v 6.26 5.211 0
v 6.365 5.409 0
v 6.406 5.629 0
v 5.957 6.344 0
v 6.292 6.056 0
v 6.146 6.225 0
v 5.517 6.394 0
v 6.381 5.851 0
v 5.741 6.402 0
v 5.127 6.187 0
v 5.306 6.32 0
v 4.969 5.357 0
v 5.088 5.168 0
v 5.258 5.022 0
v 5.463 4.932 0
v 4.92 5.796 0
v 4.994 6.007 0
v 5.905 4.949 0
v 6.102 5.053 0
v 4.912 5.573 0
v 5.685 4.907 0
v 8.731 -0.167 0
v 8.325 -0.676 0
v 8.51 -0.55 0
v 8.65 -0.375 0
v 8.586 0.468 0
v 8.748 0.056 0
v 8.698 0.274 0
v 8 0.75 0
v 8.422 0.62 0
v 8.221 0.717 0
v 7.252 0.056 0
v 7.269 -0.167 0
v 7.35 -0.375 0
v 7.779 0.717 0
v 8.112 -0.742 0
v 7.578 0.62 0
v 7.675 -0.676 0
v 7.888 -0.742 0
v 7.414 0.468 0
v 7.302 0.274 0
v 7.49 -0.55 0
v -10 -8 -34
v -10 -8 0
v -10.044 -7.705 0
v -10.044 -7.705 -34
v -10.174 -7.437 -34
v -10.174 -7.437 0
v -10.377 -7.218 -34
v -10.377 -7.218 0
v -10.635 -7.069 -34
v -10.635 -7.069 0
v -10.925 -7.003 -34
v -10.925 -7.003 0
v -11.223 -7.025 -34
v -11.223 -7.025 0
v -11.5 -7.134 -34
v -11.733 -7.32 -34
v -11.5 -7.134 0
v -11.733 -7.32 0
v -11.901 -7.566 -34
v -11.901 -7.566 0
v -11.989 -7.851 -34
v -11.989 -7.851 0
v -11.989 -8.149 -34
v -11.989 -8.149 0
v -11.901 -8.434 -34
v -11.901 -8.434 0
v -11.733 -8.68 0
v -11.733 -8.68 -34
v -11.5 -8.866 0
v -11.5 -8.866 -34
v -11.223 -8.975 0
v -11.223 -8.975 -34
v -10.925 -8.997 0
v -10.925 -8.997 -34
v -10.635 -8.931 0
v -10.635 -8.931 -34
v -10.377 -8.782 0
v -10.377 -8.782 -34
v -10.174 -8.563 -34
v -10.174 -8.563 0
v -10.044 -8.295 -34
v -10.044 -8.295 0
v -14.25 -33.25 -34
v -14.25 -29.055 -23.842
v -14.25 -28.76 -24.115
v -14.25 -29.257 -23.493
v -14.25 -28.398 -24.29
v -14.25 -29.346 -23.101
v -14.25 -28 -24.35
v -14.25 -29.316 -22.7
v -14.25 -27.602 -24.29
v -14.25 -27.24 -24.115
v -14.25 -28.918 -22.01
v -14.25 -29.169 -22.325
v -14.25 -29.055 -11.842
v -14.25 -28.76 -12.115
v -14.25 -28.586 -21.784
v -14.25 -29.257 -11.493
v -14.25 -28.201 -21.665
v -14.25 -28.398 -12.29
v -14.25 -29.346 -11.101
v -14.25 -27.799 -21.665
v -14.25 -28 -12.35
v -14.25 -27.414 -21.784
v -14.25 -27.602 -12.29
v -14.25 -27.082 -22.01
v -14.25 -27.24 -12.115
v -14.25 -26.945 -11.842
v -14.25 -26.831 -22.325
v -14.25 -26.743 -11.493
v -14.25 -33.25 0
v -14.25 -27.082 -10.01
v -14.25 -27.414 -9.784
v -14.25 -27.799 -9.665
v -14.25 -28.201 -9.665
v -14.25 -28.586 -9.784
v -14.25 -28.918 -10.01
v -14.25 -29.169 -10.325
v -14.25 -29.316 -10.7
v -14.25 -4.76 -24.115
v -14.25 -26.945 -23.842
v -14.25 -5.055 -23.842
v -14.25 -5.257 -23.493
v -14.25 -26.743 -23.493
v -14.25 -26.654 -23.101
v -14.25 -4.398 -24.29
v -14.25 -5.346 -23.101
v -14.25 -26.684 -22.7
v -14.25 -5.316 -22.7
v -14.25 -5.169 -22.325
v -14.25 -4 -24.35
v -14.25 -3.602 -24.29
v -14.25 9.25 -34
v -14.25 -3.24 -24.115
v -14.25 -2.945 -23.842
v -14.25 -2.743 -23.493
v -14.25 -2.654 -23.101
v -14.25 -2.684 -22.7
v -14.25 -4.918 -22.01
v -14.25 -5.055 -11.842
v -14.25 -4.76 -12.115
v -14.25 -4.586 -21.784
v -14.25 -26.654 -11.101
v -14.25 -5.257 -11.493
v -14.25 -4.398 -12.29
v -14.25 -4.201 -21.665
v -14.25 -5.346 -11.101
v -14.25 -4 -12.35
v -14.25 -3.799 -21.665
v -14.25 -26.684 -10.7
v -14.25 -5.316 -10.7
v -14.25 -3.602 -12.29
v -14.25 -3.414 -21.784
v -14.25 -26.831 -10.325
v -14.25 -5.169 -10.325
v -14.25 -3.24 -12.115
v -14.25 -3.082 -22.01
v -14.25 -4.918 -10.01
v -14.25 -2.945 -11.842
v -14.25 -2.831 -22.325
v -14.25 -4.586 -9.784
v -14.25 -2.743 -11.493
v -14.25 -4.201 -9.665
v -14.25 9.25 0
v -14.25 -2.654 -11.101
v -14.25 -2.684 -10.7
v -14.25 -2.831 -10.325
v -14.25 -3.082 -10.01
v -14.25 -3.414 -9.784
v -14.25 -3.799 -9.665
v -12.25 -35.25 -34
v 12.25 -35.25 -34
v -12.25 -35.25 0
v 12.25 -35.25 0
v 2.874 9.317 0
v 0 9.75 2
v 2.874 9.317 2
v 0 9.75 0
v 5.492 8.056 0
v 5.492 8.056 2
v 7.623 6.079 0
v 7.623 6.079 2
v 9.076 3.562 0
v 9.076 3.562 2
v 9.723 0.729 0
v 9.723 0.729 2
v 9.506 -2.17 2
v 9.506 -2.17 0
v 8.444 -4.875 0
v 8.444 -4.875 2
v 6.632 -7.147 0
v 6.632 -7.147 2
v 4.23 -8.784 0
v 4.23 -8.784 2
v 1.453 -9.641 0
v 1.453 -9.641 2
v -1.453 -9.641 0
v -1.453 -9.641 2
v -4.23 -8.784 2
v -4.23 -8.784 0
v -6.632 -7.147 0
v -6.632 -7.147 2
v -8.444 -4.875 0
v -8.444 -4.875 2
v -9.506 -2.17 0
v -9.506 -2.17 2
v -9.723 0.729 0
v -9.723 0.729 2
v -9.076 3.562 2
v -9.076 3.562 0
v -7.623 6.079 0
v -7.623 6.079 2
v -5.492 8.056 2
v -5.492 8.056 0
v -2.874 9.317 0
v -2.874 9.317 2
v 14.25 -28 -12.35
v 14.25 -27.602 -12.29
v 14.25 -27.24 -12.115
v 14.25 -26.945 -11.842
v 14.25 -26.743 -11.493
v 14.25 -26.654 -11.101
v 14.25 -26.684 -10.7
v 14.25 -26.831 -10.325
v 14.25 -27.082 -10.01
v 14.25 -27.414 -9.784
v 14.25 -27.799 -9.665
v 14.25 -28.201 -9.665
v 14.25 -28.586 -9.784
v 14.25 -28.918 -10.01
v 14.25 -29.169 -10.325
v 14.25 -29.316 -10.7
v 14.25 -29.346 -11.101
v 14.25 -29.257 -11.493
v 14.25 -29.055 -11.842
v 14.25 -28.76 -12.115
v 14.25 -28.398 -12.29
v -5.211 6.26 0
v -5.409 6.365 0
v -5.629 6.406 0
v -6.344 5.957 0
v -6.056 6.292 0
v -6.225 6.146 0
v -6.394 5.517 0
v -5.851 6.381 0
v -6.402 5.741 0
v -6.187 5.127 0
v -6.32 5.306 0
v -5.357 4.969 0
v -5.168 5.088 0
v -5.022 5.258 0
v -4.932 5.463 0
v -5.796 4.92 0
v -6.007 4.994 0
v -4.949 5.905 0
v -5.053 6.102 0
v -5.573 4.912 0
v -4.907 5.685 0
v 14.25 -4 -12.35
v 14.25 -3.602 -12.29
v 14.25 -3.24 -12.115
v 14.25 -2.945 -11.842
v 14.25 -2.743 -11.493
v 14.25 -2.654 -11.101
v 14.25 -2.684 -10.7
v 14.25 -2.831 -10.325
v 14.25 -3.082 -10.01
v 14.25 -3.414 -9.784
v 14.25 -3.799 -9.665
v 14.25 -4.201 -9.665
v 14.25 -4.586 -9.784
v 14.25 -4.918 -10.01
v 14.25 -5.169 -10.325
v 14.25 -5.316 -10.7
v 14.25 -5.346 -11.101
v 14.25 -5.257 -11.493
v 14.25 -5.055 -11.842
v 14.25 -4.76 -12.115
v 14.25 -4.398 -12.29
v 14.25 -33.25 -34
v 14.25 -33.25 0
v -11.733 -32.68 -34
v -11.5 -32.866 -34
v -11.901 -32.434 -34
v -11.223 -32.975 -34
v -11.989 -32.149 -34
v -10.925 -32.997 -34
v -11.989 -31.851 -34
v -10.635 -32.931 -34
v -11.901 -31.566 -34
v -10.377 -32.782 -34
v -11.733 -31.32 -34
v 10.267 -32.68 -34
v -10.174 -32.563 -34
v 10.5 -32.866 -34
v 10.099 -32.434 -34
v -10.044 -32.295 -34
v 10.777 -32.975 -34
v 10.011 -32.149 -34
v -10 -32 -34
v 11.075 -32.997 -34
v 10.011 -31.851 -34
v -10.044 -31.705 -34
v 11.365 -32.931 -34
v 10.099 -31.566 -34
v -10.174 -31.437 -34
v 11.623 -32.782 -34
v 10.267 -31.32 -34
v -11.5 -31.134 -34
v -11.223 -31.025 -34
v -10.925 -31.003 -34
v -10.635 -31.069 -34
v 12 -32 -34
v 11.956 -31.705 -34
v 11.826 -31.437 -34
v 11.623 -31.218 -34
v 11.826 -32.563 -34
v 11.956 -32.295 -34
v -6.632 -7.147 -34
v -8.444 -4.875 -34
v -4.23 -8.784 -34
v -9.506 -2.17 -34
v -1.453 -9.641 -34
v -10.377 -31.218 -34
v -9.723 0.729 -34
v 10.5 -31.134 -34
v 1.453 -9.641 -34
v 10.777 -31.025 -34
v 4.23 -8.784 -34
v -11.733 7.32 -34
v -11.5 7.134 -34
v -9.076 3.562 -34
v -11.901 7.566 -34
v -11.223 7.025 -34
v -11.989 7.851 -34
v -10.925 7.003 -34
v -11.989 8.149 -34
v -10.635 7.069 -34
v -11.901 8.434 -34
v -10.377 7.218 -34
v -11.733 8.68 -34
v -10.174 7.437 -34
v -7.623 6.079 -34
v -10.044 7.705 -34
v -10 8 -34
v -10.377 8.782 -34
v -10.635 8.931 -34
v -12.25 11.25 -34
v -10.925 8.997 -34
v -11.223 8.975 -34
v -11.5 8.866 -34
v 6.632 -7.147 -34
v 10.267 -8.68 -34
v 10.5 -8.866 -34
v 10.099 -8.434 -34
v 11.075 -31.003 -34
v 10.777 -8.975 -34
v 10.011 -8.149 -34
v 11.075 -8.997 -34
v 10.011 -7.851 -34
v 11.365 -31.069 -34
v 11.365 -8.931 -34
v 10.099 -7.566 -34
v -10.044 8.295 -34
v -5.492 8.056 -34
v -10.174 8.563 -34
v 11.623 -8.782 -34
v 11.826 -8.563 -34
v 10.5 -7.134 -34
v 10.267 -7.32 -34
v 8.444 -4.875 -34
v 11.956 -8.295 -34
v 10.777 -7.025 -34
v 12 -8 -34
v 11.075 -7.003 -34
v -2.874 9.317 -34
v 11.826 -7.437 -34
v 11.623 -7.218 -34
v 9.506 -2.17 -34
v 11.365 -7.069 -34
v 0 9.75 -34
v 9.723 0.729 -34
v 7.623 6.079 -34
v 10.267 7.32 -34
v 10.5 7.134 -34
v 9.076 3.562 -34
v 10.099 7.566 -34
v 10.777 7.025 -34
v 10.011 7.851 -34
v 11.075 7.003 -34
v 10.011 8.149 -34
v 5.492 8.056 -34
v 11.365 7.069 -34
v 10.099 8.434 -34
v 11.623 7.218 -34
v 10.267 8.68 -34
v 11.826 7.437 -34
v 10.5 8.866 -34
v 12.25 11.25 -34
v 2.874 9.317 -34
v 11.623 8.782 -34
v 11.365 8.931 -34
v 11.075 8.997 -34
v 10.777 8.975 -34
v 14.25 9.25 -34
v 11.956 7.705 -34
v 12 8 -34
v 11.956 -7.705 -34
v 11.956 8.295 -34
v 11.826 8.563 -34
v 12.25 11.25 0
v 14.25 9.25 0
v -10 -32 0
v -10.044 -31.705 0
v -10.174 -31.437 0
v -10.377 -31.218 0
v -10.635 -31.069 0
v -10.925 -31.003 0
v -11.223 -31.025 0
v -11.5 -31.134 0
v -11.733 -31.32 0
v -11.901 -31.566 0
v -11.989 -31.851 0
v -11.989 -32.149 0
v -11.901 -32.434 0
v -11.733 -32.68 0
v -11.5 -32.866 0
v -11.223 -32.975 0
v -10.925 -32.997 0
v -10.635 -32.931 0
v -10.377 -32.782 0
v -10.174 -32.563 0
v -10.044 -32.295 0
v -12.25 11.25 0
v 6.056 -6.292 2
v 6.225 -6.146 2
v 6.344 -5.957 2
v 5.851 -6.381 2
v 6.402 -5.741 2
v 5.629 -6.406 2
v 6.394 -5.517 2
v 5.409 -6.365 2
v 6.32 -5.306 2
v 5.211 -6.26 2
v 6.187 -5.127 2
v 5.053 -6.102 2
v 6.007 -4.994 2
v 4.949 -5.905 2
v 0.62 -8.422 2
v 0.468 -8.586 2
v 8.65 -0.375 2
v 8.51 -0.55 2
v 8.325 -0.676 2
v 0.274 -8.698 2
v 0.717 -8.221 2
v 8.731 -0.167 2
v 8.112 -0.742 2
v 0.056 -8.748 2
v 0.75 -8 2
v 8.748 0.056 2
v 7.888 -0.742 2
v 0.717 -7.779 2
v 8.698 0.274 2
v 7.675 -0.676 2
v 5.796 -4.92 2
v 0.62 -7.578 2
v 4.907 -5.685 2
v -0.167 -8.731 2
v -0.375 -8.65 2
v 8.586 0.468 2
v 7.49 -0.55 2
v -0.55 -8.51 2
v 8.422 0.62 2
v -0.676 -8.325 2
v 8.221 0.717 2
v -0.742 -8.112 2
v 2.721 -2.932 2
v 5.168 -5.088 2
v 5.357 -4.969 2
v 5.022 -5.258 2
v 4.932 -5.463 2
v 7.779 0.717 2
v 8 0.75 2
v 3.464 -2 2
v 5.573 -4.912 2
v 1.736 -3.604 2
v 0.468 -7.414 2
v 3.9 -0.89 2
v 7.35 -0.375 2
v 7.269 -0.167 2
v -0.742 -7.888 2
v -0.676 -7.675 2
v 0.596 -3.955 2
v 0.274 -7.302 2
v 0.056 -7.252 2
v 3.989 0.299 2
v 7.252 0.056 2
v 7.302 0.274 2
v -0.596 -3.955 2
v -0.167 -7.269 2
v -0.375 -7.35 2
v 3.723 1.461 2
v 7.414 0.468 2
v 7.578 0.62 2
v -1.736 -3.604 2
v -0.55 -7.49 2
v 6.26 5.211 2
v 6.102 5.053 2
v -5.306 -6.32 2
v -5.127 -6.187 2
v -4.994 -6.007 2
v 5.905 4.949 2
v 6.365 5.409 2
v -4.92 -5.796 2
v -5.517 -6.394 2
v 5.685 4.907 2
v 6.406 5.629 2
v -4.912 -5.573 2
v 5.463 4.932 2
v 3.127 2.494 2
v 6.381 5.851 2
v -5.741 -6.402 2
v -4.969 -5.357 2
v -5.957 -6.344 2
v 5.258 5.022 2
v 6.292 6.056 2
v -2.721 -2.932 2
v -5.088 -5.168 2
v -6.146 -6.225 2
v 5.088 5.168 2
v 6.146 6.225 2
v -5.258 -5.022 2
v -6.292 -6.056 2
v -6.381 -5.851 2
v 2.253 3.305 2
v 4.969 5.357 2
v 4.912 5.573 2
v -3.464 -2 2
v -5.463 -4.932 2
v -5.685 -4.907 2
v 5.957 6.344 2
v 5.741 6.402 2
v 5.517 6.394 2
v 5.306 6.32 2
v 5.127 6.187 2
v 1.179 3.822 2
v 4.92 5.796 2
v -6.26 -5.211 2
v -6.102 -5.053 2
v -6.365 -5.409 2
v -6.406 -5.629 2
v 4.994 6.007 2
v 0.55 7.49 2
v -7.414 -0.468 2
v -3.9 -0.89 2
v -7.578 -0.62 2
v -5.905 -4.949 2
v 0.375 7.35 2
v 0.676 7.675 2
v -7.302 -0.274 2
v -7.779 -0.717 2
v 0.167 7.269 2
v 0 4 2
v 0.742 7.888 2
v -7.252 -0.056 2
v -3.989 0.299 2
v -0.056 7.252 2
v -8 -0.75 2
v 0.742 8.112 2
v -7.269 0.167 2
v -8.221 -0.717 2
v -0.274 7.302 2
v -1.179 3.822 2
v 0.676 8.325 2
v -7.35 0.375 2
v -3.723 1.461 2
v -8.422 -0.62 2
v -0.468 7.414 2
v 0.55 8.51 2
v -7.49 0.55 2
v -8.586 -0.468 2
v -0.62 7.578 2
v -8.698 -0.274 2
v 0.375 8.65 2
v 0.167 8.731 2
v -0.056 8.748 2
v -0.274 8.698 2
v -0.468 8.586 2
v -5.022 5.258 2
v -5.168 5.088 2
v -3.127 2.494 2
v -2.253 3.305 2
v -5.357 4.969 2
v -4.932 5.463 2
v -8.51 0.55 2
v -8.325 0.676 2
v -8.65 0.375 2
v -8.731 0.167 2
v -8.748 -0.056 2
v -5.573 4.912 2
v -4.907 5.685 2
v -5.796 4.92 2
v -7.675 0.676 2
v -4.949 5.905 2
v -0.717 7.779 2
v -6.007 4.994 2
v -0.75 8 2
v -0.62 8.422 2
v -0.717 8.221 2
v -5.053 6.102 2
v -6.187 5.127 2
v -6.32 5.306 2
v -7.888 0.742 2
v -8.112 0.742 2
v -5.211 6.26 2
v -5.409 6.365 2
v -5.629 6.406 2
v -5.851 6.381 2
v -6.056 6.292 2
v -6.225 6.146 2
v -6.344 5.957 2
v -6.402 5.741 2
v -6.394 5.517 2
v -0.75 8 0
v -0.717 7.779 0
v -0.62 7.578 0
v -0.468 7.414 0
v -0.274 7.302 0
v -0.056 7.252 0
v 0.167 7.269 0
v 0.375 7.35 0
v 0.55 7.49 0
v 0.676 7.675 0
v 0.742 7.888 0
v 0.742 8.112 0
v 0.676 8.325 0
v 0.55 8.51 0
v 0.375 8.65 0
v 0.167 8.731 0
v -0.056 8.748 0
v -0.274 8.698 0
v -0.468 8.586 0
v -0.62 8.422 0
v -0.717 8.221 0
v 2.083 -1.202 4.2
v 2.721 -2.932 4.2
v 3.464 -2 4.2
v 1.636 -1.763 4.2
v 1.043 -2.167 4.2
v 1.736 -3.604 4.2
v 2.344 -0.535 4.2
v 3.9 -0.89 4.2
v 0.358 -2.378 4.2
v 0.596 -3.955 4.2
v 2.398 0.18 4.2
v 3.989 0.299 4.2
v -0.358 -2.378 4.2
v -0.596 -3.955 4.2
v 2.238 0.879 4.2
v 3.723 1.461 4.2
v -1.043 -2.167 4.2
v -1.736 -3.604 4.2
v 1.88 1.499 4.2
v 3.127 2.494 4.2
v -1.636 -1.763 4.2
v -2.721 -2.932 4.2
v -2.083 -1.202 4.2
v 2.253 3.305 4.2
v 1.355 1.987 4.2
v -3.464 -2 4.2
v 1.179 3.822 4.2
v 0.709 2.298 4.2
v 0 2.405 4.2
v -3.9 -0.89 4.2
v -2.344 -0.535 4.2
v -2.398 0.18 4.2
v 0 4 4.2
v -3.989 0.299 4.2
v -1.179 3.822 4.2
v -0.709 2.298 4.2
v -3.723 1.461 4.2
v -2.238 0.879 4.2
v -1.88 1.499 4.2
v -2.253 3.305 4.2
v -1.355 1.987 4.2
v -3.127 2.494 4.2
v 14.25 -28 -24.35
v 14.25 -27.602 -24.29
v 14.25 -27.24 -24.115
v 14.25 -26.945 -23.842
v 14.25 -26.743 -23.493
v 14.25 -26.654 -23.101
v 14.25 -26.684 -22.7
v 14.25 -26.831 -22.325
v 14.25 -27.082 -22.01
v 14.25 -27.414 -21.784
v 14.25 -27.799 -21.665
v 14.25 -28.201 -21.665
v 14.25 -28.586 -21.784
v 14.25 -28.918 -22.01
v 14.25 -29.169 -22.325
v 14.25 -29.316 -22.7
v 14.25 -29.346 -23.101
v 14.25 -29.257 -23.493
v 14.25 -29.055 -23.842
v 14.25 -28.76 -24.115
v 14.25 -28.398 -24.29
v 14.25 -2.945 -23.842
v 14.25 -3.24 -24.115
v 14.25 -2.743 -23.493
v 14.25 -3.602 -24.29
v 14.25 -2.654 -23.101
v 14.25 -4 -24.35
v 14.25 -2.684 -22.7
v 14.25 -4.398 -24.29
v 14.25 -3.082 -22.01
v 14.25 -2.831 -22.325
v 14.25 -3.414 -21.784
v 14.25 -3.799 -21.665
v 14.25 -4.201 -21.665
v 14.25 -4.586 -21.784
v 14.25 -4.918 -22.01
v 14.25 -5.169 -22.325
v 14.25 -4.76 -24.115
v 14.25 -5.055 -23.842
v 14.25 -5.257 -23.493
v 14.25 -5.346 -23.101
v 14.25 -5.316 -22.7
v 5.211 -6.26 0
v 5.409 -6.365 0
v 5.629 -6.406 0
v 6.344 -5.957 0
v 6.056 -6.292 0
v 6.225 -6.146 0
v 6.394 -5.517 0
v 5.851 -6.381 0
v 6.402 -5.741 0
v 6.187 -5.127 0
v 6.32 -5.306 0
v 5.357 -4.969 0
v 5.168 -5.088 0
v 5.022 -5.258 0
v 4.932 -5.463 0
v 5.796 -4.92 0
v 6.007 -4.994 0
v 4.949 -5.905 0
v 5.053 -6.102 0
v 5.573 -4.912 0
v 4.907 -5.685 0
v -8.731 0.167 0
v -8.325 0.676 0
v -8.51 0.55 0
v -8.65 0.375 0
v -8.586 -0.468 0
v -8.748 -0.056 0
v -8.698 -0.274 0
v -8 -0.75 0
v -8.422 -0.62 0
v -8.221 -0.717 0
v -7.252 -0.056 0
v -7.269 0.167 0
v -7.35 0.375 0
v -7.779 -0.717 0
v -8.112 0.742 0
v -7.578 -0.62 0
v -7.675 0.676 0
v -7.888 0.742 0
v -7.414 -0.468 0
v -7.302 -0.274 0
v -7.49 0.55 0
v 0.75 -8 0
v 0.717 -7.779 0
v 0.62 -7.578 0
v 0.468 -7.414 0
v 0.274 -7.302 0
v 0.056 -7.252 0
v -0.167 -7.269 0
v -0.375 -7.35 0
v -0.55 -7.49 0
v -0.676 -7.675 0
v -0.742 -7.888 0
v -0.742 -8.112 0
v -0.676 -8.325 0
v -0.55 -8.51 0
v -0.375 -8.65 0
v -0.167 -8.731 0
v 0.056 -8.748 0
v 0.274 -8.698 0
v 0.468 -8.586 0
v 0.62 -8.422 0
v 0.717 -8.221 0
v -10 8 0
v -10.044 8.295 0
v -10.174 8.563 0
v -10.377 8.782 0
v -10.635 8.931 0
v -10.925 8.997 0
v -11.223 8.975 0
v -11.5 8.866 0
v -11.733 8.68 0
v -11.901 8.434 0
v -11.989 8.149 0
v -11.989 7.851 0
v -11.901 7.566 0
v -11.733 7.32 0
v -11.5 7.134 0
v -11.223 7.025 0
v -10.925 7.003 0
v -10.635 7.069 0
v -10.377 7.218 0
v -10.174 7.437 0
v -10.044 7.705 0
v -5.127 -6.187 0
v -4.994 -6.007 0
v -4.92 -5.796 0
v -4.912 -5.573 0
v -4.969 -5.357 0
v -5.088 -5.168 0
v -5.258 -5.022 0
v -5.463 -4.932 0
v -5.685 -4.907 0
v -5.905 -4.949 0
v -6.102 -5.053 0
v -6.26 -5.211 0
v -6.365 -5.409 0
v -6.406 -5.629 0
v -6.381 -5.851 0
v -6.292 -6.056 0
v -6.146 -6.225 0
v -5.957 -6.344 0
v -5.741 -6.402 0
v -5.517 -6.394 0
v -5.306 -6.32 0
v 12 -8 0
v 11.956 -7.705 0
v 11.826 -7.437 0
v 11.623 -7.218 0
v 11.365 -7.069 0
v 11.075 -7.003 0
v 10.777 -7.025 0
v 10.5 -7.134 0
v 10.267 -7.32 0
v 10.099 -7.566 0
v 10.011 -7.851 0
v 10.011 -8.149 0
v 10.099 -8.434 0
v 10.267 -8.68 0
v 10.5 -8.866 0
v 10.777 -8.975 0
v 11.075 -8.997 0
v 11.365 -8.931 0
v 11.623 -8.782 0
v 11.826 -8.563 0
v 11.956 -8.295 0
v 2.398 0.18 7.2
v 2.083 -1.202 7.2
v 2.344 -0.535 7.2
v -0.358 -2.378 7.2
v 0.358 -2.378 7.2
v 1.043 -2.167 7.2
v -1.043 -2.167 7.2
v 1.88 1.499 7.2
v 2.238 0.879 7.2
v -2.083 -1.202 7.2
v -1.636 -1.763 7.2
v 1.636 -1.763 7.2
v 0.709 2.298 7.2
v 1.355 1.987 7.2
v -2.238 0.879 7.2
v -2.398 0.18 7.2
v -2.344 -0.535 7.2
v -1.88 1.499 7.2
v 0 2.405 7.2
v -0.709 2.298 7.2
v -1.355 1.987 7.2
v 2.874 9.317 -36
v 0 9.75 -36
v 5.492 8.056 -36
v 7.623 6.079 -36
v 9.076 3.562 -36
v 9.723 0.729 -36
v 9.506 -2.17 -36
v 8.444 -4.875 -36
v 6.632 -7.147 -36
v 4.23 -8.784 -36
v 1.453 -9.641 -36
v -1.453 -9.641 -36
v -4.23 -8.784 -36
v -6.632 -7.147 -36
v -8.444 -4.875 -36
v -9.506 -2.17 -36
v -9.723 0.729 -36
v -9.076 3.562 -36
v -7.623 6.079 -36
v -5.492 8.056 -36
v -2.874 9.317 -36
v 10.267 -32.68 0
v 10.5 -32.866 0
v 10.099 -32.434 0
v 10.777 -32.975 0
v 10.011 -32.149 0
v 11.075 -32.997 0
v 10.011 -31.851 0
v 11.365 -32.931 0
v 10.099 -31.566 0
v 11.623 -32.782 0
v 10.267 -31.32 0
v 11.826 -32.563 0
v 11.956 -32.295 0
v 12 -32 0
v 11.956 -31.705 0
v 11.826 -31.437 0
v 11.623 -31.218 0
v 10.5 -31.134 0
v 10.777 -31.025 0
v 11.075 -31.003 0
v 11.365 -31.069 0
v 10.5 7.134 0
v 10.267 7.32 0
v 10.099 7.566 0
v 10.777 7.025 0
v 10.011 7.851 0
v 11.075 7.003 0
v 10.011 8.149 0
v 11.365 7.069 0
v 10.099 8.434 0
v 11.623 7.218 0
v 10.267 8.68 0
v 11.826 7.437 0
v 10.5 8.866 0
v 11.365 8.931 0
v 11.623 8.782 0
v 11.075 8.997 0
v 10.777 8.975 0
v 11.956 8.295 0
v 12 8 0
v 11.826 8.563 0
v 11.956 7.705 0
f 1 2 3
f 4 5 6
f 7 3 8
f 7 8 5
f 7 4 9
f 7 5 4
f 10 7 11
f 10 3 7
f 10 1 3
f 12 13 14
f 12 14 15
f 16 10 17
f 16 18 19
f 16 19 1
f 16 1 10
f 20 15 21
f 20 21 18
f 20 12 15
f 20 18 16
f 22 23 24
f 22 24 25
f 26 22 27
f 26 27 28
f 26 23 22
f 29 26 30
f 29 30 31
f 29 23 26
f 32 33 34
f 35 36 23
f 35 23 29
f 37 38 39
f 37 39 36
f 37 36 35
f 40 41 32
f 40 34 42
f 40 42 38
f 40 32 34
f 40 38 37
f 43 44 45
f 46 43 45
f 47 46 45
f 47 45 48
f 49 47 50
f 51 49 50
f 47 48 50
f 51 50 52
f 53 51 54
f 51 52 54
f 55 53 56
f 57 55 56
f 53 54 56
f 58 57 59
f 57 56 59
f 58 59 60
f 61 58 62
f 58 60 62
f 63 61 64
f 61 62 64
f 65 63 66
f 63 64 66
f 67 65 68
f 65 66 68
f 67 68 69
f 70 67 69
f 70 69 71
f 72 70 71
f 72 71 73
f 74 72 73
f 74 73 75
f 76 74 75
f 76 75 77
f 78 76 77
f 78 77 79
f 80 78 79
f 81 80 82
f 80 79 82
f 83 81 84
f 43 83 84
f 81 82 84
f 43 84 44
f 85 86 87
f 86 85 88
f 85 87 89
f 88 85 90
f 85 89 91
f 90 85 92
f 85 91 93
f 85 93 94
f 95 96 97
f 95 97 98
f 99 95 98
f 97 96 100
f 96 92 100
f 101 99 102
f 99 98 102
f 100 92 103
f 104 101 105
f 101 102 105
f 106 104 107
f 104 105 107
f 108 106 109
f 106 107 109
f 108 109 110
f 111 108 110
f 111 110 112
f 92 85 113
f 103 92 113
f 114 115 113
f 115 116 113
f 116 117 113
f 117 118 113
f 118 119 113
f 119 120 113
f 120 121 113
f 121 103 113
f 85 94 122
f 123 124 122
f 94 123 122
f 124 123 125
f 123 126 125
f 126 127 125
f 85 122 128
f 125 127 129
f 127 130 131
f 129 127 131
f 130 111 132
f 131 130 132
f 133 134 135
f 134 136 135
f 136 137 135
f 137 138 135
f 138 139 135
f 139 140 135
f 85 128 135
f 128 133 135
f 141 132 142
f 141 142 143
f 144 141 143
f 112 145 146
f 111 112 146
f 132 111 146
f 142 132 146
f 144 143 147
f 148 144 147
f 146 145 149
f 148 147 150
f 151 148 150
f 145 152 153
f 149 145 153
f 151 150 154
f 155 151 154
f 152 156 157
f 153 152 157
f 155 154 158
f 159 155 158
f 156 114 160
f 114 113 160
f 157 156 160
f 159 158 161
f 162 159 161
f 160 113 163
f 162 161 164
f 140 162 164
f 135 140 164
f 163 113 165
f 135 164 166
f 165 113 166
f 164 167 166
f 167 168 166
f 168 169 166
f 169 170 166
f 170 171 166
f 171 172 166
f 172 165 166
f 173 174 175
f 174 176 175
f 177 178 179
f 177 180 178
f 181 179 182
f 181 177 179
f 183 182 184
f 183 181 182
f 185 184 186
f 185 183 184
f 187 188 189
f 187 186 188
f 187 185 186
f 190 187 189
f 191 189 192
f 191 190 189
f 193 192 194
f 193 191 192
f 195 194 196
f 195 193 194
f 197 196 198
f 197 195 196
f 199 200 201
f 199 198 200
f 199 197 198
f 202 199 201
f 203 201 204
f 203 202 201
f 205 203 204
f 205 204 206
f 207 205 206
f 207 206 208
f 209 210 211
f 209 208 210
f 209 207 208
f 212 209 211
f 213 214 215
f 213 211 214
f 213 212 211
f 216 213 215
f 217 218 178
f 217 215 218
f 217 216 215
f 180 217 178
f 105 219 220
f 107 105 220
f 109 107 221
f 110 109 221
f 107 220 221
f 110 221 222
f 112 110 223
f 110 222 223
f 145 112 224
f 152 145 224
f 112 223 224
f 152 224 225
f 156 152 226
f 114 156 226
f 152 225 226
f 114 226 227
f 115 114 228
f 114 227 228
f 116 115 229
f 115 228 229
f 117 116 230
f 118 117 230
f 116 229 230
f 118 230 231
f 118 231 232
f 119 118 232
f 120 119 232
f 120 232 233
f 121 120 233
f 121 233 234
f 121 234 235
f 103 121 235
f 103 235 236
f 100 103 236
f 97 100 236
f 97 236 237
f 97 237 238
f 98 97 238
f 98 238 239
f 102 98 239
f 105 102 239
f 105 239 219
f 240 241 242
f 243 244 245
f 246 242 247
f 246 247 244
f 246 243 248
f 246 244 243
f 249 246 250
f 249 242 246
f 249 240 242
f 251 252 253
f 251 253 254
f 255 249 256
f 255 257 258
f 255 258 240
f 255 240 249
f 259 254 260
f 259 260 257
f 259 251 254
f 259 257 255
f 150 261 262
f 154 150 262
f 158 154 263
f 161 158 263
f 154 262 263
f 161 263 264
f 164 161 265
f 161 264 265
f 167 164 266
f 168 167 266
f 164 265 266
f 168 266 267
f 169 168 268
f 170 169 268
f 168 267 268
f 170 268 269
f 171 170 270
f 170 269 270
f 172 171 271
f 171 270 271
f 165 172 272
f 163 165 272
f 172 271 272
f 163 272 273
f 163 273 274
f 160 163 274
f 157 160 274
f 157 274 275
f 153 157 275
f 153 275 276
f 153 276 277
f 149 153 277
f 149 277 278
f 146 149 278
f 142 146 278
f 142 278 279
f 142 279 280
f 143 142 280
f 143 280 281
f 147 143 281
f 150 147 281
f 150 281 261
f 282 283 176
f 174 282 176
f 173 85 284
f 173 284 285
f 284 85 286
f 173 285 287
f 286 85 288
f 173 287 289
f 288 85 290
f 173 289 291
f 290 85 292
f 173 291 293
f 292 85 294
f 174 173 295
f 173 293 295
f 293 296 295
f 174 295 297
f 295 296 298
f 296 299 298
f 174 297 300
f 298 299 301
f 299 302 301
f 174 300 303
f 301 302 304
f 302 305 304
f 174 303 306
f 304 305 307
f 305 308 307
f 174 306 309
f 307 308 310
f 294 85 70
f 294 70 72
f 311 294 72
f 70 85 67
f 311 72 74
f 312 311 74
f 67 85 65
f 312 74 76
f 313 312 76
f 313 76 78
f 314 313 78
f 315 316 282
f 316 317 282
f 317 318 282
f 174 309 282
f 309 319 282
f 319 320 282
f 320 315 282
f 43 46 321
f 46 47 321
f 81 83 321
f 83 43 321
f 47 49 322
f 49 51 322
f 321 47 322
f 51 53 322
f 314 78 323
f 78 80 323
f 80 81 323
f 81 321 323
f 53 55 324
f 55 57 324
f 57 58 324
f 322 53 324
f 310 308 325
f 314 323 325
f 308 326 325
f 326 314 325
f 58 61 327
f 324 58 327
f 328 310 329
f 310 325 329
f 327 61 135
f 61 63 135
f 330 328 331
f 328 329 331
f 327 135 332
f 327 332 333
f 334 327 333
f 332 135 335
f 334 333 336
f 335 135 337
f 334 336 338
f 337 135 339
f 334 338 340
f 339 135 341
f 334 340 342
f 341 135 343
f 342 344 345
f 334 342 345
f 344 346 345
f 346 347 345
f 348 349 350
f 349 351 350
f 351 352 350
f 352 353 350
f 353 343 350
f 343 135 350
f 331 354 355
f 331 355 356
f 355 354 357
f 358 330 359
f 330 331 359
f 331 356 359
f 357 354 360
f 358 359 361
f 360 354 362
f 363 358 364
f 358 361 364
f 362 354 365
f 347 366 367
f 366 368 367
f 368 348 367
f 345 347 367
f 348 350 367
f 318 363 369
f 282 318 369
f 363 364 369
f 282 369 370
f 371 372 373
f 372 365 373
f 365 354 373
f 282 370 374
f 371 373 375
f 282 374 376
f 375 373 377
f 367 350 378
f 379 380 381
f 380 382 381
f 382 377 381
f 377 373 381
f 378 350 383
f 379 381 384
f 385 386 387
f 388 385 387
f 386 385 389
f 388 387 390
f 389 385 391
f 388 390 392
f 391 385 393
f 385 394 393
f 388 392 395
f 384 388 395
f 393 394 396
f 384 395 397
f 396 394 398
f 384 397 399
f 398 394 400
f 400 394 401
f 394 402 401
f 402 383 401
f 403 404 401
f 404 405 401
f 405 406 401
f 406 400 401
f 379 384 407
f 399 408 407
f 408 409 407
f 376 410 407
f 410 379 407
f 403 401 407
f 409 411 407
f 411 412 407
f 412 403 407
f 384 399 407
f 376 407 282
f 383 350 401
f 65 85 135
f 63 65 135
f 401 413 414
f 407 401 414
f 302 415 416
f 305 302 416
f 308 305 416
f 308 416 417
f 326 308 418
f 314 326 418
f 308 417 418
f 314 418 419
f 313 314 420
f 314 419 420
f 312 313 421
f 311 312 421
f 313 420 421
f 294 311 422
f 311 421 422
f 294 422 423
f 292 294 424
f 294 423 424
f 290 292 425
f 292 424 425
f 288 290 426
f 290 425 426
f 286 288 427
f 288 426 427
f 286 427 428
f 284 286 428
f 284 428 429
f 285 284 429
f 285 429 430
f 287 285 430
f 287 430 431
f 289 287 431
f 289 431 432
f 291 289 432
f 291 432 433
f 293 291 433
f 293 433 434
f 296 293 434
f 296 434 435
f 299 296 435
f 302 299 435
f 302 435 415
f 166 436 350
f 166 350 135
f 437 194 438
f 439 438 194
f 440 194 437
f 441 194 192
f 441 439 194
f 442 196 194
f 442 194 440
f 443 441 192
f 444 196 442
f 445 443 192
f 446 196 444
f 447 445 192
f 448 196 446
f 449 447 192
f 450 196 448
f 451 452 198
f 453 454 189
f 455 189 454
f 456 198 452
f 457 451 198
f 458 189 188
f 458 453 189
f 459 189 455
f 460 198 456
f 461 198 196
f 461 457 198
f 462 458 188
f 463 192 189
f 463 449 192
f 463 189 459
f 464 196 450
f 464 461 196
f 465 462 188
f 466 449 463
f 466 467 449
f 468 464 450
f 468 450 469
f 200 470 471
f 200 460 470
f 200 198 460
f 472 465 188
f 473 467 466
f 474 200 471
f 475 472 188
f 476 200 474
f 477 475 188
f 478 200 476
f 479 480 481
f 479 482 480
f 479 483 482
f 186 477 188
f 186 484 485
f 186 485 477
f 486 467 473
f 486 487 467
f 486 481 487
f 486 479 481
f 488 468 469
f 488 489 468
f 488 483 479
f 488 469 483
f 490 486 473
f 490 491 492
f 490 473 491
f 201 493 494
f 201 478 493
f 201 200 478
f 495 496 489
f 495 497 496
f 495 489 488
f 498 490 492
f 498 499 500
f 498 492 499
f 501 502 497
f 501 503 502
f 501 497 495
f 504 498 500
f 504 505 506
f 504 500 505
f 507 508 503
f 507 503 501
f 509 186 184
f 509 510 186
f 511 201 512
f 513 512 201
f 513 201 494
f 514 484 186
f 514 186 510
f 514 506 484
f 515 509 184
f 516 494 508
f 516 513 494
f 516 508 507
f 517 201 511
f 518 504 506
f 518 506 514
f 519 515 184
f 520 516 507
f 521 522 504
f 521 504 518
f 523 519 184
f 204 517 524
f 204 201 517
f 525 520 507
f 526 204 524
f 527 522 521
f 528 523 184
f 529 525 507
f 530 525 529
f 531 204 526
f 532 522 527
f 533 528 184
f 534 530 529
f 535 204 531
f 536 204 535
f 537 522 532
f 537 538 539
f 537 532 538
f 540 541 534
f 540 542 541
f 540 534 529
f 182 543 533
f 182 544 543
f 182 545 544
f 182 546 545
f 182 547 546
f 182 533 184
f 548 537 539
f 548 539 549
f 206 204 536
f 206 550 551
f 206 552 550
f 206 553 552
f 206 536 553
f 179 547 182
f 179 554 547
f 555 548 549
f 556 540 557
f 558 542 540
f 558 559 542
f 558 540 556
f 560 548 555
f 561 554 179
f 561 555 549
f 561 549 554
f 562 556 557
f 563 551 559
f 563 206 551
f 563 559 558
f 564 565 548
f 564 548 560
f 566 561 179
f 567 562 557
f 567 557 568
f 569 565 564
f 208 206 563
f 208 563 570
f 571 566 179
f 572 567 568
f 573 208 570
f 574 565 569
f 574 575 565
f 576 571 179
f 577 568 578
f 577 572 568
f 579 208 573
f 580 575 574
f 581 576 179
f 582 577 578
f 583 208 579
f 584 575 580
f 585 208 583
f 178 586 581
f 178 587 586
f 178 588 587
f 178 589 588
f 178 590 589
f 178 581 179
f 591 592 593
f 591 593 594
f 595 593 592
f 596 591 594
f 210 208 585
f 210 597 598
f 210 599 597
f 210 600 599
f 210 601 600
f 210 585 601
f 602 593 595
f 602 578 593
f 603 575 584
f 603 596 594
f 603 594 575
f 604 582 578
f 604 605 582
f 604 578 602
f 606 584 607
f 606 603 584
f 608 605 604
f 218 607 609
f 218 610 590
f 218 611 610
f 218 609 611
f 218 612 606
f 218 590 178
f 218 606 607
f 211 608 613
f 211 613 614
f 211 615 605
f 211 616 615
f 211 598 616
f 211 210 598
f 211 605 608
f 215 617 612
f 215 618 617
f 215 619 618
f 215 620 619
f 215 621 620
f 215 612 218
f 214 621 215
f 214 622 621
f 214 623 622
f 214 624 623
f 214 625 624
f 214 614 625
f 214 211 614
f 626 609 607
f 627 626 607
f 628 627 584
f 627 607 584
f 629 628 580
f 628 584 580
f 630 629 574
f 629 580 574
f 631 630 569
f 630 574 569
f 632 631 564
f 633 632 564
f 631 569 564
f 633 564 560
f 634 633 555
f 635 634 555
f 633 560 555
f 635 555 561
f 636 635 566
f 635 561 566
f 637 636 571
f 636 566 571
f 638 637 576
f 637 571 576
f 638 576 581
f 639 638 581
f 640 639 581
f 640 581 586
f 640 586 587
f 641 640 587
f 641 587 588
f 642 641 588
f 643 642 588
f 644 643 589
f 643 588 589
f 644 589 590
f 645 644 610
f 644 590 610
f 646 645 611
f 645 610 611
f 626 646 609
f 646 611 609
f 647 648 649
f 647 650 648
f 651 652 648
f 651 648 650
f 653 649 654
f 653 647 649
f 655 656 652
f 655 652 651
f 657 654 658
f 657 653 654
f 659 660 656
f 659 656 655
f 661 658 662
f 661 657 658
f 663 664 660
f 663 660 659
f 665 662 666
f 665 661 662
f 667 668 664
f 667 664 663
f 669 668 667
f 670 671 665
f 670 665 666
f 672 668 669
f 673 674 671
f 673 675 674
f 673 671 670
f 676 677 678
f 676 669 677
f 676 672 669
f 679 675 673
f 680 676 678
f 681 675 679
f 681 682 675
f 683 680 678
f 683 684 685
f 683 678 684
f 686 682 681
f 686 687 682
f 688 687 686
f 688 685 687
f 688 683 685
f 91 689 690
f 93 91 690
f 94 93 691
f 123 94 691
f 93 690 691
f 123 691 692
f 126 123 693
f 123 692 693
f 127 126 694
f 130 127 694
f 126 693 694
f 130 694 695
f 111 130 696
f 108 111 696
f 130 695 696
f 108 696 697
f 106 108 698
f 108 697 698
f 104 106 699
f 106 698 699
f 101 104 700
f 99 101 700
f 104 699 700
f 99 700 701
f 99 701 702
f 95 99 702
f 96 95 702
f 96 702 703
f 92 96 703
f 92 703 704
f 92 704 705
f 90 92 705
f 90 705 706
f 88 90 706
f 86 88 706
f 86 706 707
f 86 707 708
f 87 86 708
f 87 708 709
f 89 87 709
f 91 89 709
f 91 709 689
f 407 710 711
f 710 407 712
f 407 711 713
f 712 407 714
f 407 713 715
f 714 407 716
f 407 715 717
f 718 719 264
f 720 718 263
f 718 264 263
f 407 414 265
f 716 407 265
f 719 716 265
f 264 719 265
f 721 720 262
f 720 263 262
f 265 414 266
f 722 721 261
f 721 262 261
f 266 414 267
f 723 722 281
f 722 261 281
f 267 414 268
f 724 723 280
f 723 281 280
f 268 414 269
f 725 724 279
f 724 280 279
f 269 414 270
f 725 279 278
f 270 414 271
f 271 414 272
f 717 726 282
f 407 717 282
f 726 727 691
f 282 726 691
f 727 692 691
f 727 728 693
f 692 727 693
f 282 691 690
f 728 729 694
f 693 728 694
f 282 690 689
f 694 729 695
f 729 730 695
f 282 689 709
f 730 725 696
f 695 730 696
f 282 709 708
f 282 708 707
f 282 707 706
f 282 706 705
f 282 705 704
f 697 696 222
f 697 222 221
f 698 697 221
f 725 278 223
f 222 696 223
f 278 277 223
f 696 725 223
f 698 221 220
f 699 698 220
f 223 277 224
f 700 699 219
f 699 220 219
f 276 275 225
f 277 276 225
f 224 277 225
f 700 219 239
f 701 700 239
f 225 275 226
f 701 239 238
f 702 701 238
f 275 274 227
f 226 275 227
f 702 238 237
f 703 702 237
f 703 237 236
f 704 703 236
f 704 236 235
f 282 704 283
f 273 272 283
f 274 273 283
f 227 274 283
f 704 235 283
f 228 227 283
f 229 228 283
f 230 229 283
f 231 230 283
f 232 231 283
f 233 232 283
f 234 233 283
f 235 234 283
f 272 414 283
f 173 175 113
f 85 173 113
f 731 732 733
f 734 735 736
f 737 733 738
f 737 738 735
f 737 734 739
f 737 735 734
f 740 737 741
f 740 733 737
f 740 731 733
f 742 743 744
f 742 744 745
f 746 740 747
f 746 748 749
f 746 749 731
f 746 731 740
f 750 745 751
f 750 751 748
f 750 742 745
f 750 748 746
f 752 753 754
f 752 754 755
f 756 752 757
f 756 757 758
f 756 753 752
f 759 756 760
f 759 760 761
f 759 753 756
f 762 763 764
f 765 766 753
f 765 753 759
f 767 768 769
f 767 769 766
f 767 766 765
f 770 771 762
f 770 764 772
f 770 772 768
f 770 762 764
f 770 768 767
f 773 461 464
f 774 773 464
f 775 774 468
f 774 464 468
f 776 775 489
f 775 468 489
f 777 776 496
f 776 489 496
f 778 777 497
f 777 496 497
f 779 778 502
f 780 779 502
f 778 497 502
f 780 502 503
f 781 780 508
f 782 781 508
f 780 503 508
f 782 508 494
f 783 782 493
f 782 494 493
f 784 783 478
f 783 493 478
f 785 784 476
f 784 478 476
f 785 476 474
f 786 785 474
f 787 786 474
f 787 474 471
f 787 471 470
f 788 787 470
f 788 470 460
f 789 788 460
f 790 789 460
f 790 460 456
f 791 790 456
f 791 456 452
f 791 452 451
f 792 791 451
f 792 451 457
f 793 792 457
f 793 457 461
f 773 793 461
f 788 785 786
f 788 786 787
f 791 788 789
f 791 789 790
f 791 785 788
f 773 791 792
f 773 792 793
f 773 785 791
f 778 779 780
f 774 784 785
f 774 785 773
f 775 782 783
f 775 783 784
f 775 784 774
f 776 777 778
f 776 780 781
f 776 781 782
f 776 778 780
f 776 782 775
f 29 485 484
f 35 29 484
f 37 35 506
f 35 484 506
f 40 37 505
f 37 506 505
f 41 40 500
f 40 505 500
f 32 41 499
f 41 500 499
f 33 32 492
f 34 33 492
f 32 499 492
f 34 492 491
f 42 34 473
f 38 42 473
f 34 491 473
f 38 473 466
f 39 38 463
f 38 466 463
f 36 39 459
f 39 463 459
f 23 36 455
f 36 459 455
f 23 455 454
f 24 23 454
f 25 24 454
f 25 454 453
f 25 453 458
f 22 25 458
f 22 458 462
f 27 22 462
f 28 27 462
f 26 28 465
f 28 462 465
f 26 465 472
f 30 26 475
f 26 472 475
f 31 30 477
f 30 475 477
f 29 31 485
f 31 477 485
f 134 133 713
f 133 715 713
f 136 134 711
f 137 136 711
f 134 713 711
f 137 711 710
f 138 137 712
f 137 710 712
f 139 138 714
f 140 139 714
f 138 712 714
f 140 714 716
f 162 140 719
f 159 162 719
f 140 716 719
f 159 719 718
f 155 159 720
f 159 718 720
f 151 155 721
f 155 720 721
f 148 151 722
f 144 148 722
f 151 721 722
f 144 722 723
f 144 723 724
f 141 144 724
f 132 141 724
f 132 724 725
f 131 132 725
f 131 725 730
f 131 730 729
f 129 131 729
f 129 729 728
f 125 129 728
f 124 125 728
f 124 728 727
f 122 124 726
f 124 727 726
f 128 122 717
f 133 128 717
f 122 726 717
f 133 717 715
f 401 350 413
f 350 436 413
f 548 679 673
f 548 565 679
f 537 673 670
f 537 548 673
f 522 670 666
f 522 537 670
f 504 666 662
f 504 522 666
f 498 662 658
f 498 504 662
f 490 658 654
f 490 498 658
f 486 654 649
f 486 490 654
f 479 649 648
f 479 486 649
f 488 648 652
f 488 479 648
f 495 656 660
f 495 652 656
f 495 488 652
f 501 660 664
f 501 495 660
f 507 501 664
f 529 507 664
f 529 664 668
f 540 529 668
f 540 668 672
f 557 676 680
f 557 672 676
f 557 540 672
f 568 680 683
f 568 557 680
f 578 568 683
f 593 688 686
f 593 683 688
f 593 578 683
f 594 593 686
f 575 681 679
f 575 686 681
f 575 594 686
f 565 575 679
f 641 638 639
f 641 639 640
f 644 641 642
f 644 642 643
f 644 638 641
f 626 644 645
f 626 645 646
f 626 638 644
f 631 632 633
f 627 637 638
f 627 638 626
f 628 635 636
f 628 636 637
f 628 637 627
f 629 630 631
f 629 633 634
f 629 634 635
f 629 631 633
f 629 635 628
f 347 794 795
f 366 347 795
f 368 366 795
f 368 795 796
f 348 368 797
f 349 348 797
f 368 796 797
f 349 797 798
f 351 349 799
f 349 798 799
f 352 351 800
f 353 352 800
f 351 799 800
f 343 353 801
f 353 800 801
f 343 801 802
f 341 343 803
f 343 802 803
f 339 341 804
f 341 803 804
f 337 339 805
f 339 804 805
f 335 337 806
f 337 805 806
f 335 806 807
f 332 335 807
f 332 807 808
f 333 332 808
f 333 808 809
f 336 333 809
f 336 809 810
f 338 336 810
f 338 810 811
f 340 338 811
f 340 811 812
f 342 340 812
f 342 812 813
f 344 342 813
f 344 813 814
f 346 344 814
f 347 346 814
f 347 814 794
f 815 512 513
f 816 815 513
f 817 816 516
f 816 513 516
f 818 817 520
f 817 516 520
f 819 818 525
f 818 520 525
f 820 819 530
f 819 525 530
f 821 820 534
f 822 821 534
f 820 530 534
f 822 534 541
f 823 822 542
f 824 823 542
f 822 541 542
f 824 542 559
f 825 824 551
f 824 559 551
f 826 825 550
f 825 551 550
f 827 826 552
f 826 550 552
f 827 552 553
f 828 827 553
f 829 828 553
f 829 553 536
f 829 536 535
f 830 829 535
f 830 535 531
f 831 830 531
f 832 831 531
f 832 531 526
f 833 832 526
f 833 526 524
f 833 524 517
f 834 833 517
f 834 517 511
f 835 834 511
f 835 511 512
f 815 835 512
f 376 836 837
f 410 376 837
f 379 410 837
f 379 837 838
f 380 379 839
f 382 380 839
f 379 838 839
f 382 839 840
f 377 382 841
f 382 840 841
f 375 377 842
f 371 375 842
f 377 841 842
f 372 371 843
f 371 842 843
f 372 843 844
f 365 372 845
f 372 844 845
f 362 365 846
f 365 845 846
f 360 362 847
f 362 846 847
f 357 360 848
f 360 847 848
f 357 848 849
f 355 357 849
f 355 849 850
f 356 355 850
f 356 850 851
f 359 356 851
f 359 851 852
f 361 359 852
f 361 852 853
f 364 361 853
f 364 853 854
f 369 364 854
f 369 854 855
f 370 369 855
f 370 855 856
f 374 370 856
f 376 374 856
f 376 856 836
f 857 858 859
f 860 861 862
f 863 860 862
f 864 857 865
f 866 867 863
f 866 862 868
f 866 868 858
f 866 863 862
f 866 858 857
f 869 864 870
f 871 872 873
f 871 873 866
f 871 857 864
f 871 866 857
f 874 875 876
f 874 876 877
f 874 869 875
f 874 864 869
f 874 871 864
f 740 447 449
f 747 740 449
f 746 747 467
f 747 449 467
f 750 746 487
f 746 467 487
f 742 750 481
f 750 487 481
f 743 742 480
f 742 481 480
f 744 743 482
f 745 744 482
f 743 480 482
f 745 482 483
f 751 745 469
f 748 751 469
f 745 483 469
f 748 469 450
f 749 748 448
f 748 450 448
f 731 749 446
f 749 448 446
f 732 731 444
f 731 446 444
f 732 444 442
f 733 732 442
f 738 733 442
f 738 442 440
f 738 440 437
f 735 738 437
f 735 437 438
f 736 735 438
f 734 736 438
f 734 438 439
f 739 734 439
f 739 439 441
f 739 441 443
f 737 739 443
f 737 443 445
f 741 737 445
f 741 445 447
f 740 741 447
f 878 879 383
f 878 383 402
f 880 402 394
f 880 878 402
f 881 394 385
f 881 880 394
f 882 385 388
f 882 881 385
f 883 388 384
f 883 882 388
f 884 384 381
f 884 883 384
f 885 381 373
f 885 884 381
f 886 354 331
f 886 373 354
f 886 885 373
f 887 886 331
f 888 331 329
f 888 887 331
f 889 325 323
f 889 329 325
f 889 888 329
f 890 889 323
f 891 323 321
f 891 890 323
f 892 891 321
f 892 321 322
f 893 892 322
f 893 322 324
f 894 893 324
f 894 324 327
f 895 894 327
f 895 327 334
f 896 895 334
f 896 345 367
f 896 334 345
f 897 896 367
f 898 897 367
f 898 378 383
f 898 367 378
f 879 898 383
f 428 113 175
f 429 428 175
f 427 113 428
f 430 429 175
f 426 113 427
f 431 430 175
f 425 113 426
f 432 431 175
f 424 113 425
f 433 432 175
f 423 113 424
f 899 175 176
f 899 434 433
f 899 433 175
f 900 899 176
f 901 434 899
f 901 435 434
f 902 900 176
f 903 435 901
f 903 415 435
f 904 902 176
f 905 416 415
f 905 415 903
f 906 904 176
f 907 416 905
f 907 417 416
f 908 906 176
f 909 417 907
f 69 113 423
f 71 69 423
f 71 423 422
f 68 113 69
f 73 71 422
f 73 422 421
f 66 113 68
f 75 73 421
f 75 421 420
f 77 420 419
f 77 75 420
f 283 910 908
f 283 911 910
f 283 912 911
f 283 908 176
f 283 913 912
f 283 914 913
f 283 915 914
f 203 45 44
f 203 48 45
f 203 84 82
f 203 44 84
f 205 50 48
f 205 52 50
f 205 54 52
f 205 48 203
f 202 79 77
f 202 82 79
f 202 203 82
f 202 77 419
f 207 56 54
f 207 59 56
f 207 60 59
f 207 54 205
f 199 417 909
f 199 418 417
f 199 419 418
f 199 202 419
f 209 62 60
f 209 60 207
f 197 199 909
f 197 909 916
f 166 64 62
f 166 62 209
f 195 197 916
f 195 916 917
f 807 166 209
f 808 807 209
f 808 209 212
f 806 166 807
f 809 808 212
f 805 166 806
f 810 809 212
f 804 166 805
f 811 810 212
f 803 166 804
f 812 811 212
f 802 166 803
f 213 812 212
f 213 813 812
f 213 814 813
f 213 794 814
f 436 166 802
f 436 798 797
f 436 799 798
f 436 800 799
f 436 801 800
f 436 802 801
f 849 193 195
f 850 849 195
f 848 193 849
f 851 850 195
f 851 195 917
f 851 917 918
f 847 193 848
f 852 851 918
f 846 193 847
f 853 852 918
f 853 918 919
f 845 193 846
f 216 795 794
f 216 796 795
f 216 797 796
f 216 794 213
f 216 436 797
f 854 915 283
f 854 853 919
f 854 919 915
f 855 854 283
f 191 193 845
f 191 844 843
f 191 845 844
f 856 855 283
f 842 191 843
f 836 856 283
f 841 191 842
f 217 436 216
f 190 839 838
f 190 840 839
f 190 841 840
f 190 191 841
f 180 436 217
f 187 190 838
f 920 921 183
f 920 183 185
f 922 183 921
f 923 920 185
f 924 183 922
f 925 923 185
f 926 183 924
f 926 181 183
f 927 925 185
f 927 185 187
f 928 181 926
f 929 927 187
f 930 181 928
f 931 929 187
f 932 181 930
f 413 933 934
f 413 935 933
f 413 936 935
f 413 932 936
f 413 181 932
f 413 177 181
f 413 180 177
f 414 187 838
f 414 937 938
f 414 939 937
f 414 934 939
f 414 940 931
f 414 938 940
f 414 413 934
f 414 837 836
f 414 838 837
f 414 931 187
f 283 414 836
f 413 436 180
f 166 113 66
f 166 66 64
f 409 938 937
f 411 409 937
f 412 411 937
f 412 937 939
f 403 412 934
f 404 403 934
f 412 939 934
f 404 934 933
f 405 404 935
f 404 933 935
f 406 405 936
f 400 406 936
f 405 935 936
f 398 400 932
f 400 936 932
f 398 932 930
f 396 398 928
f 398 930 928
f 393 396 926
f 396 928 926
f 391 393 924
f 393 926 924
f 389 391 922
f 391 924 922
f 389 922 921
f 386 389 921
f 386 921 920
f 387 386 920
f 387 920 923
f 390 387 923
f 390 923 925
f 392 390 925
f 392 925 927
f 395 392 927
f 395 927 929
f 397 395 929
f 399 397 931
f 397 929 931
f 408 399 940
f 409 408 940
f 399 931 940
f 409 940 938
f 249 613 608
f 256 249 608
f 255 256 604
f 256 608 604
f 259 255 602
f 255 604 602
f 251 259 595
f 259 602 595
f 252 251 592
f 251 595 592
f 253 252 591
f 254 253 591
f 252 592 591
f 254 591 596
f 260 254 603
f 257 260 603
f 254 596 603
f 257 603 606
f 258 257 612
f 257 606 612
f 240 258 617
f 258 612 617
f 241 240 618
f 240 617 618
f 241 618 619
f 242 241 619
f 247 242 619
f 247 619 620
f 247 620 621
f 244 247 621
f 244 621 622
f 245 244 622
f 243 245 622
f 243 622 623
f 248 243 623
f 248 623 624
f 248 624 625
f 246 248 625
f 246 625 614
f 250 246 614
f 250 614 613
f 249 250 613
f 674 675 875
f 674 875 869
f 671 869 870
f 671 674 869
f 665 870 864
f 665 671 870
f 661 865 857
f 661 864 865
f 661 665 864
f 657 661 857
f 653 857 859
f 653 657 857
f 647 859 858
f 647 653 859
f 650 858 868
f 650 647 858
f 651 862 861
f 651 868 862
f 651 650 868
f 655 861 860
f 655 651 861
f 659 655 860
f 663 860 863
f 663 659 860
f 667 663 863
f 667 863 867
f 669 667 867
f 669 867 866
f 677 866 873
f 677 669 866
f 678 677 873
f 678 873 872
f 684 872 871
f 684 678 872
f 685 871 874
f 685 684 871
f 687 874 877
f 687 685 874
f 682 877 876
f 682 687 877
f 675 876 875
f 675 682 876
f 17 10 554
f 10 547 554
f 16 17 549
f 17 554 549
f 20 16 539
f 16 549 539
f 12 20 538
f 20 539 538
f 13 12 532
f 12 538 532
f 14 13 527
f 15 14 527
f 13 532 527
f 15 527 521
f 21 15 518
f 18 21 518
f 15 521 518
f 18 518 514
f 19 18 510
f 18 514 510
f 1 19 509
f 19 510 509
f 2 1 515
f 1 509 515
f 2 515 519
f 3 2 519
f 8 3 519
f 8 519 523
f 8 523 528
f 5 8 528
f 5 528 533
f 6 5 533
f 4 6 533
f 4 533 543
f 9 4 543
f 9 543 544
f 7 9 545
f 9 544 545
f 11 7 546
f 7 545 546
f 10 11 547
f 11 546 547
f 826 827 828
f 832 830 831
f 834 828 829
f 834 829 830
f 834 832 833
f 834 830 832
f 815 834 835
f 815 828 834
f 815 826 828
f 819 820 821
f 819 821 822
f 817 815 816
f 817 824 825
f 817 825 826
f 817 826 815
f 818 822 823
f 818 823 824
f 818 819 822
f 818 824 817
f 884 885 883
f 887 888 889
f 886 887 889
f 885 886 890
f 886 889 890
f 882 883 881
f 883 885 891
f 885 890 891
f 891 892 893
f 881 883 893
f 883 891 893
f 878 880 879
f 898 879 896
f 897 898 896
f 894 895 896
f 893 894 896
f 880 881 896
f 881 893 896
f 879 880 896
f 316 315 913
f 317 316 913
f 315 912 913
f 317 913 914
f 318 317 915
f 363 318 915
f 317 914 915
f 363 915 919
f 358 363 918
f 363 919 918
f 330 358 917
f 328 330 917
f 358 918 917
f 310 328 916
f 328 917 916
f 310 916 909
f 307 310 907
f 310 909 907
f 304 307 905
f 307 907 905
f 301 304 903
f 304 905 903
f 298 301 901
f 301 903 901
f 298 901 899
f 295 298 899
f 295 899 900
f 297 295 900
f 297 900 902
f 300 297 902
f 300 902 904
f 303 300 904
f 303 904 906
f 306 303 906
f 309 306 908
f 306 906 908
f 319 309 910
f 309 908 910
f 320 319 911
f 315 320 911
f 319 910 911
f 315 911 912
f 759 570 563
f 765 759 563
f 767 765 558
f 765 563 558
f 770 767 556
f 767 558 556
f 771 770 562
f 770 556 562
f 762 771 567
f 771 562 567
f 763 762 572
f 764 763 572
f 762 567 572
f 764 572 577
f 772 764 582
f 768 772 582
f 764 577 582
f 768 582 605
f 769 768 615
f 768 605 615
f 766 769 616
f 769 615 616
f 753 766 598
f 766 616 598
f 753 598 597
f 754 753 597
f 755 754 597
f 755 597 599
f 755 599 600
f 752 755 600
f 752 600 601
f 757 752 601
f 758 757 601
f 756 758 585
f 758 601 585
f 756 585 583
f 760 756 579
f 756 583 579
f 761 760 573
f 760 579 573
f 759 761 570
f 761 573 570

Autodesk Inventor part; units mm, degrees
ref_plane "YZ Plane" through (0, 0, 0) normal (1, 0, 0) x (0, 1, 0)
ref_plane "XZ Plane" through (0, 0, 0) normal (0, 1, 0) x (-1, 0, 0)
ref_plane "XY Plane" through (0, 0, 0) normal (0, 0, 1) x (1, 0, 0)
sketch "Эскиз1" plane through (0, 0, 0) normal (0, 0, 1) x (1, 0, 0)
  line L0 (-12.25, 11.25) -> (12.25, 11.25)
  line L1 (14.25, 9.25) -> (14.25, -33.25)
  line L2 (12.25, -35.25) -> (-12.25, -35.25)
  line L3 (-14.25, -33.25) -> (-14.25, 9.25)
  circle A0 centre (-11, 8) radius 1
  circle A1 centre (-11, -8) radius 1
  circle A2 centre (11, 8) radius 1
  circle A3 centre (11, -8) radius 1
  circle A4 centre (11, -32) radius 1
  circle A5 centre (-11, -32) radius 1
  line L4 (-12.25, 11.25) -> (-14.25, 9.25)
  line L5 (12.25, 11.25) -> (14.25, 9.25)
  line L6 (14.25, -33.25) -> (12.25, -35.25)
  line L7 (-12.25, -35.25) -> (-14.25, -33.25)
  point P0 (0, 0)
  point P1 (-14.25, 11.25)
  point P2 (14.25, -35.25)
  point P3 (14.25, 11.25)
  point P4 (-14.25, -35.25)
  point P5 (0, 11.25)
  dimension "d0" = 28.5
  dimension "d1" = 46.5
  dimension "d2" = 11.25
  dimension "d3" = 22
  dimension "d4" = 11
  dimension "d5" = 8
  dimension "d6" = 8
  dimension "d7" = 40
  dimension "d8" = 2
  dimension "d11" = 2
  dimension "d12" = 2
  dimension "d13" = 2
  dimension "d14" = 2
  dimension "d15" = 2
  dimension "d16" = 2
  dimension "d17" = 2
  dimension "d18" = 2
extrude "Выдавливание1" add sketch "Эскиз1" against normal blind 34
sketch "Эскиз2" plane through (0, 0, 0) normal (1, 0, 0) x (0, 1, 0)
  line L0 (0, 0) -> (0, 7.2)
  line L1 (0, 7.2) -> (2.4047, 7.2)
  line L2 (2.4047, 7.2) -> (2.4047, 4.2)
  line L3 (2.4047, 4.2) -> (4, 4.2)
  line L4 (4, 4.2) -> (4, 2)
  line L5 (4, 2) -> (9.75, 2)
  line L6 (9.75, 2) -> (9.75, 0)
  line L7 (9.75, 0) -> (0, 0)
  line L8 (-33.25, -34) -> (9.25, -34) projected
  line L9 (0, -34) -> (9.75, -34)
  line L10 (9.75, -34) -> (9.75, -36)
  line L11 (9.75, -36) -> (0, -36)
  line L12 (0, -36) -> (0, -34)
  point P0 (1.2024, 7.2)
  dimension "d19" = 19.5
  dimension "d20" = 8
  dimension "d21" = 2
  dimension "d22" = 2.2
  dimension "d23" = 2
  dimension "d24" = 19.5
  dimension "d25" = 41.2
revolve "Вращение1" add sketch "Эскиз2" angle 360 about axis through (0, 0, 0) along (0, 0, 1)
sketch "Эскиз3" plane through (14.25, -33.25, 0) normal (1, 0, 0) x (0, 0, -1)
  circle A0 centre (11, 29.25) radius 1.35
  circle A1 centre (11, 5.25) radius 1.35
  circle A2 centre (23, 29.25) radius 1.35
  circle A3 centre (23, 5.25) radius 1.35
  line L0 (0, 0) -> (0, 42.5) projected
  line L1 (-7.2, 35.6547) -> (-7.2, 30.8453) projected
  line L2 (-7.2, 33.25) -> (42.1725, 33.25)
  point P0 (0, 33.25)
  dimension "d27" = 11
  dimension "d28" = 12
  dimension "d29" = 24
  dimension "d30" = 4
  dimension "d31" = 2.7
extrude "Выдавливание2" cut sketch "Эскиз3" against normal up to surface (28.5 mm away)
sketch "Эскиз4" plane through (0, 0, 2) normal (0, 0, 1) x (1, 0, 0)
  circle A0 centre (0, -8) radius 0.75
  point P0 (0, 0)
  dimension "d34" = 1.5
  dimension "d35" = 8
extrude "Выдавливание3" cut sketch "Эскиз4" against normal blind 2
pattern_circular "Круговой массив1" count 8 over 360 about axis through (0, 0, 1) along (0, 0, 1) of "Выдавливание3"
equation "\"d4\" = 0.5 * d3"
equation "\"d12\" = d11"
equation "\"d13\" = d11"
equation "\"d14\" = d13"
equation "\"d15\" = d11"
equation "\"d16\" = d15"
equation "\"d17\" = d11"
equation "\"d18\" = d17"
properties part number "DYNAMIXEL XM430-W350"
